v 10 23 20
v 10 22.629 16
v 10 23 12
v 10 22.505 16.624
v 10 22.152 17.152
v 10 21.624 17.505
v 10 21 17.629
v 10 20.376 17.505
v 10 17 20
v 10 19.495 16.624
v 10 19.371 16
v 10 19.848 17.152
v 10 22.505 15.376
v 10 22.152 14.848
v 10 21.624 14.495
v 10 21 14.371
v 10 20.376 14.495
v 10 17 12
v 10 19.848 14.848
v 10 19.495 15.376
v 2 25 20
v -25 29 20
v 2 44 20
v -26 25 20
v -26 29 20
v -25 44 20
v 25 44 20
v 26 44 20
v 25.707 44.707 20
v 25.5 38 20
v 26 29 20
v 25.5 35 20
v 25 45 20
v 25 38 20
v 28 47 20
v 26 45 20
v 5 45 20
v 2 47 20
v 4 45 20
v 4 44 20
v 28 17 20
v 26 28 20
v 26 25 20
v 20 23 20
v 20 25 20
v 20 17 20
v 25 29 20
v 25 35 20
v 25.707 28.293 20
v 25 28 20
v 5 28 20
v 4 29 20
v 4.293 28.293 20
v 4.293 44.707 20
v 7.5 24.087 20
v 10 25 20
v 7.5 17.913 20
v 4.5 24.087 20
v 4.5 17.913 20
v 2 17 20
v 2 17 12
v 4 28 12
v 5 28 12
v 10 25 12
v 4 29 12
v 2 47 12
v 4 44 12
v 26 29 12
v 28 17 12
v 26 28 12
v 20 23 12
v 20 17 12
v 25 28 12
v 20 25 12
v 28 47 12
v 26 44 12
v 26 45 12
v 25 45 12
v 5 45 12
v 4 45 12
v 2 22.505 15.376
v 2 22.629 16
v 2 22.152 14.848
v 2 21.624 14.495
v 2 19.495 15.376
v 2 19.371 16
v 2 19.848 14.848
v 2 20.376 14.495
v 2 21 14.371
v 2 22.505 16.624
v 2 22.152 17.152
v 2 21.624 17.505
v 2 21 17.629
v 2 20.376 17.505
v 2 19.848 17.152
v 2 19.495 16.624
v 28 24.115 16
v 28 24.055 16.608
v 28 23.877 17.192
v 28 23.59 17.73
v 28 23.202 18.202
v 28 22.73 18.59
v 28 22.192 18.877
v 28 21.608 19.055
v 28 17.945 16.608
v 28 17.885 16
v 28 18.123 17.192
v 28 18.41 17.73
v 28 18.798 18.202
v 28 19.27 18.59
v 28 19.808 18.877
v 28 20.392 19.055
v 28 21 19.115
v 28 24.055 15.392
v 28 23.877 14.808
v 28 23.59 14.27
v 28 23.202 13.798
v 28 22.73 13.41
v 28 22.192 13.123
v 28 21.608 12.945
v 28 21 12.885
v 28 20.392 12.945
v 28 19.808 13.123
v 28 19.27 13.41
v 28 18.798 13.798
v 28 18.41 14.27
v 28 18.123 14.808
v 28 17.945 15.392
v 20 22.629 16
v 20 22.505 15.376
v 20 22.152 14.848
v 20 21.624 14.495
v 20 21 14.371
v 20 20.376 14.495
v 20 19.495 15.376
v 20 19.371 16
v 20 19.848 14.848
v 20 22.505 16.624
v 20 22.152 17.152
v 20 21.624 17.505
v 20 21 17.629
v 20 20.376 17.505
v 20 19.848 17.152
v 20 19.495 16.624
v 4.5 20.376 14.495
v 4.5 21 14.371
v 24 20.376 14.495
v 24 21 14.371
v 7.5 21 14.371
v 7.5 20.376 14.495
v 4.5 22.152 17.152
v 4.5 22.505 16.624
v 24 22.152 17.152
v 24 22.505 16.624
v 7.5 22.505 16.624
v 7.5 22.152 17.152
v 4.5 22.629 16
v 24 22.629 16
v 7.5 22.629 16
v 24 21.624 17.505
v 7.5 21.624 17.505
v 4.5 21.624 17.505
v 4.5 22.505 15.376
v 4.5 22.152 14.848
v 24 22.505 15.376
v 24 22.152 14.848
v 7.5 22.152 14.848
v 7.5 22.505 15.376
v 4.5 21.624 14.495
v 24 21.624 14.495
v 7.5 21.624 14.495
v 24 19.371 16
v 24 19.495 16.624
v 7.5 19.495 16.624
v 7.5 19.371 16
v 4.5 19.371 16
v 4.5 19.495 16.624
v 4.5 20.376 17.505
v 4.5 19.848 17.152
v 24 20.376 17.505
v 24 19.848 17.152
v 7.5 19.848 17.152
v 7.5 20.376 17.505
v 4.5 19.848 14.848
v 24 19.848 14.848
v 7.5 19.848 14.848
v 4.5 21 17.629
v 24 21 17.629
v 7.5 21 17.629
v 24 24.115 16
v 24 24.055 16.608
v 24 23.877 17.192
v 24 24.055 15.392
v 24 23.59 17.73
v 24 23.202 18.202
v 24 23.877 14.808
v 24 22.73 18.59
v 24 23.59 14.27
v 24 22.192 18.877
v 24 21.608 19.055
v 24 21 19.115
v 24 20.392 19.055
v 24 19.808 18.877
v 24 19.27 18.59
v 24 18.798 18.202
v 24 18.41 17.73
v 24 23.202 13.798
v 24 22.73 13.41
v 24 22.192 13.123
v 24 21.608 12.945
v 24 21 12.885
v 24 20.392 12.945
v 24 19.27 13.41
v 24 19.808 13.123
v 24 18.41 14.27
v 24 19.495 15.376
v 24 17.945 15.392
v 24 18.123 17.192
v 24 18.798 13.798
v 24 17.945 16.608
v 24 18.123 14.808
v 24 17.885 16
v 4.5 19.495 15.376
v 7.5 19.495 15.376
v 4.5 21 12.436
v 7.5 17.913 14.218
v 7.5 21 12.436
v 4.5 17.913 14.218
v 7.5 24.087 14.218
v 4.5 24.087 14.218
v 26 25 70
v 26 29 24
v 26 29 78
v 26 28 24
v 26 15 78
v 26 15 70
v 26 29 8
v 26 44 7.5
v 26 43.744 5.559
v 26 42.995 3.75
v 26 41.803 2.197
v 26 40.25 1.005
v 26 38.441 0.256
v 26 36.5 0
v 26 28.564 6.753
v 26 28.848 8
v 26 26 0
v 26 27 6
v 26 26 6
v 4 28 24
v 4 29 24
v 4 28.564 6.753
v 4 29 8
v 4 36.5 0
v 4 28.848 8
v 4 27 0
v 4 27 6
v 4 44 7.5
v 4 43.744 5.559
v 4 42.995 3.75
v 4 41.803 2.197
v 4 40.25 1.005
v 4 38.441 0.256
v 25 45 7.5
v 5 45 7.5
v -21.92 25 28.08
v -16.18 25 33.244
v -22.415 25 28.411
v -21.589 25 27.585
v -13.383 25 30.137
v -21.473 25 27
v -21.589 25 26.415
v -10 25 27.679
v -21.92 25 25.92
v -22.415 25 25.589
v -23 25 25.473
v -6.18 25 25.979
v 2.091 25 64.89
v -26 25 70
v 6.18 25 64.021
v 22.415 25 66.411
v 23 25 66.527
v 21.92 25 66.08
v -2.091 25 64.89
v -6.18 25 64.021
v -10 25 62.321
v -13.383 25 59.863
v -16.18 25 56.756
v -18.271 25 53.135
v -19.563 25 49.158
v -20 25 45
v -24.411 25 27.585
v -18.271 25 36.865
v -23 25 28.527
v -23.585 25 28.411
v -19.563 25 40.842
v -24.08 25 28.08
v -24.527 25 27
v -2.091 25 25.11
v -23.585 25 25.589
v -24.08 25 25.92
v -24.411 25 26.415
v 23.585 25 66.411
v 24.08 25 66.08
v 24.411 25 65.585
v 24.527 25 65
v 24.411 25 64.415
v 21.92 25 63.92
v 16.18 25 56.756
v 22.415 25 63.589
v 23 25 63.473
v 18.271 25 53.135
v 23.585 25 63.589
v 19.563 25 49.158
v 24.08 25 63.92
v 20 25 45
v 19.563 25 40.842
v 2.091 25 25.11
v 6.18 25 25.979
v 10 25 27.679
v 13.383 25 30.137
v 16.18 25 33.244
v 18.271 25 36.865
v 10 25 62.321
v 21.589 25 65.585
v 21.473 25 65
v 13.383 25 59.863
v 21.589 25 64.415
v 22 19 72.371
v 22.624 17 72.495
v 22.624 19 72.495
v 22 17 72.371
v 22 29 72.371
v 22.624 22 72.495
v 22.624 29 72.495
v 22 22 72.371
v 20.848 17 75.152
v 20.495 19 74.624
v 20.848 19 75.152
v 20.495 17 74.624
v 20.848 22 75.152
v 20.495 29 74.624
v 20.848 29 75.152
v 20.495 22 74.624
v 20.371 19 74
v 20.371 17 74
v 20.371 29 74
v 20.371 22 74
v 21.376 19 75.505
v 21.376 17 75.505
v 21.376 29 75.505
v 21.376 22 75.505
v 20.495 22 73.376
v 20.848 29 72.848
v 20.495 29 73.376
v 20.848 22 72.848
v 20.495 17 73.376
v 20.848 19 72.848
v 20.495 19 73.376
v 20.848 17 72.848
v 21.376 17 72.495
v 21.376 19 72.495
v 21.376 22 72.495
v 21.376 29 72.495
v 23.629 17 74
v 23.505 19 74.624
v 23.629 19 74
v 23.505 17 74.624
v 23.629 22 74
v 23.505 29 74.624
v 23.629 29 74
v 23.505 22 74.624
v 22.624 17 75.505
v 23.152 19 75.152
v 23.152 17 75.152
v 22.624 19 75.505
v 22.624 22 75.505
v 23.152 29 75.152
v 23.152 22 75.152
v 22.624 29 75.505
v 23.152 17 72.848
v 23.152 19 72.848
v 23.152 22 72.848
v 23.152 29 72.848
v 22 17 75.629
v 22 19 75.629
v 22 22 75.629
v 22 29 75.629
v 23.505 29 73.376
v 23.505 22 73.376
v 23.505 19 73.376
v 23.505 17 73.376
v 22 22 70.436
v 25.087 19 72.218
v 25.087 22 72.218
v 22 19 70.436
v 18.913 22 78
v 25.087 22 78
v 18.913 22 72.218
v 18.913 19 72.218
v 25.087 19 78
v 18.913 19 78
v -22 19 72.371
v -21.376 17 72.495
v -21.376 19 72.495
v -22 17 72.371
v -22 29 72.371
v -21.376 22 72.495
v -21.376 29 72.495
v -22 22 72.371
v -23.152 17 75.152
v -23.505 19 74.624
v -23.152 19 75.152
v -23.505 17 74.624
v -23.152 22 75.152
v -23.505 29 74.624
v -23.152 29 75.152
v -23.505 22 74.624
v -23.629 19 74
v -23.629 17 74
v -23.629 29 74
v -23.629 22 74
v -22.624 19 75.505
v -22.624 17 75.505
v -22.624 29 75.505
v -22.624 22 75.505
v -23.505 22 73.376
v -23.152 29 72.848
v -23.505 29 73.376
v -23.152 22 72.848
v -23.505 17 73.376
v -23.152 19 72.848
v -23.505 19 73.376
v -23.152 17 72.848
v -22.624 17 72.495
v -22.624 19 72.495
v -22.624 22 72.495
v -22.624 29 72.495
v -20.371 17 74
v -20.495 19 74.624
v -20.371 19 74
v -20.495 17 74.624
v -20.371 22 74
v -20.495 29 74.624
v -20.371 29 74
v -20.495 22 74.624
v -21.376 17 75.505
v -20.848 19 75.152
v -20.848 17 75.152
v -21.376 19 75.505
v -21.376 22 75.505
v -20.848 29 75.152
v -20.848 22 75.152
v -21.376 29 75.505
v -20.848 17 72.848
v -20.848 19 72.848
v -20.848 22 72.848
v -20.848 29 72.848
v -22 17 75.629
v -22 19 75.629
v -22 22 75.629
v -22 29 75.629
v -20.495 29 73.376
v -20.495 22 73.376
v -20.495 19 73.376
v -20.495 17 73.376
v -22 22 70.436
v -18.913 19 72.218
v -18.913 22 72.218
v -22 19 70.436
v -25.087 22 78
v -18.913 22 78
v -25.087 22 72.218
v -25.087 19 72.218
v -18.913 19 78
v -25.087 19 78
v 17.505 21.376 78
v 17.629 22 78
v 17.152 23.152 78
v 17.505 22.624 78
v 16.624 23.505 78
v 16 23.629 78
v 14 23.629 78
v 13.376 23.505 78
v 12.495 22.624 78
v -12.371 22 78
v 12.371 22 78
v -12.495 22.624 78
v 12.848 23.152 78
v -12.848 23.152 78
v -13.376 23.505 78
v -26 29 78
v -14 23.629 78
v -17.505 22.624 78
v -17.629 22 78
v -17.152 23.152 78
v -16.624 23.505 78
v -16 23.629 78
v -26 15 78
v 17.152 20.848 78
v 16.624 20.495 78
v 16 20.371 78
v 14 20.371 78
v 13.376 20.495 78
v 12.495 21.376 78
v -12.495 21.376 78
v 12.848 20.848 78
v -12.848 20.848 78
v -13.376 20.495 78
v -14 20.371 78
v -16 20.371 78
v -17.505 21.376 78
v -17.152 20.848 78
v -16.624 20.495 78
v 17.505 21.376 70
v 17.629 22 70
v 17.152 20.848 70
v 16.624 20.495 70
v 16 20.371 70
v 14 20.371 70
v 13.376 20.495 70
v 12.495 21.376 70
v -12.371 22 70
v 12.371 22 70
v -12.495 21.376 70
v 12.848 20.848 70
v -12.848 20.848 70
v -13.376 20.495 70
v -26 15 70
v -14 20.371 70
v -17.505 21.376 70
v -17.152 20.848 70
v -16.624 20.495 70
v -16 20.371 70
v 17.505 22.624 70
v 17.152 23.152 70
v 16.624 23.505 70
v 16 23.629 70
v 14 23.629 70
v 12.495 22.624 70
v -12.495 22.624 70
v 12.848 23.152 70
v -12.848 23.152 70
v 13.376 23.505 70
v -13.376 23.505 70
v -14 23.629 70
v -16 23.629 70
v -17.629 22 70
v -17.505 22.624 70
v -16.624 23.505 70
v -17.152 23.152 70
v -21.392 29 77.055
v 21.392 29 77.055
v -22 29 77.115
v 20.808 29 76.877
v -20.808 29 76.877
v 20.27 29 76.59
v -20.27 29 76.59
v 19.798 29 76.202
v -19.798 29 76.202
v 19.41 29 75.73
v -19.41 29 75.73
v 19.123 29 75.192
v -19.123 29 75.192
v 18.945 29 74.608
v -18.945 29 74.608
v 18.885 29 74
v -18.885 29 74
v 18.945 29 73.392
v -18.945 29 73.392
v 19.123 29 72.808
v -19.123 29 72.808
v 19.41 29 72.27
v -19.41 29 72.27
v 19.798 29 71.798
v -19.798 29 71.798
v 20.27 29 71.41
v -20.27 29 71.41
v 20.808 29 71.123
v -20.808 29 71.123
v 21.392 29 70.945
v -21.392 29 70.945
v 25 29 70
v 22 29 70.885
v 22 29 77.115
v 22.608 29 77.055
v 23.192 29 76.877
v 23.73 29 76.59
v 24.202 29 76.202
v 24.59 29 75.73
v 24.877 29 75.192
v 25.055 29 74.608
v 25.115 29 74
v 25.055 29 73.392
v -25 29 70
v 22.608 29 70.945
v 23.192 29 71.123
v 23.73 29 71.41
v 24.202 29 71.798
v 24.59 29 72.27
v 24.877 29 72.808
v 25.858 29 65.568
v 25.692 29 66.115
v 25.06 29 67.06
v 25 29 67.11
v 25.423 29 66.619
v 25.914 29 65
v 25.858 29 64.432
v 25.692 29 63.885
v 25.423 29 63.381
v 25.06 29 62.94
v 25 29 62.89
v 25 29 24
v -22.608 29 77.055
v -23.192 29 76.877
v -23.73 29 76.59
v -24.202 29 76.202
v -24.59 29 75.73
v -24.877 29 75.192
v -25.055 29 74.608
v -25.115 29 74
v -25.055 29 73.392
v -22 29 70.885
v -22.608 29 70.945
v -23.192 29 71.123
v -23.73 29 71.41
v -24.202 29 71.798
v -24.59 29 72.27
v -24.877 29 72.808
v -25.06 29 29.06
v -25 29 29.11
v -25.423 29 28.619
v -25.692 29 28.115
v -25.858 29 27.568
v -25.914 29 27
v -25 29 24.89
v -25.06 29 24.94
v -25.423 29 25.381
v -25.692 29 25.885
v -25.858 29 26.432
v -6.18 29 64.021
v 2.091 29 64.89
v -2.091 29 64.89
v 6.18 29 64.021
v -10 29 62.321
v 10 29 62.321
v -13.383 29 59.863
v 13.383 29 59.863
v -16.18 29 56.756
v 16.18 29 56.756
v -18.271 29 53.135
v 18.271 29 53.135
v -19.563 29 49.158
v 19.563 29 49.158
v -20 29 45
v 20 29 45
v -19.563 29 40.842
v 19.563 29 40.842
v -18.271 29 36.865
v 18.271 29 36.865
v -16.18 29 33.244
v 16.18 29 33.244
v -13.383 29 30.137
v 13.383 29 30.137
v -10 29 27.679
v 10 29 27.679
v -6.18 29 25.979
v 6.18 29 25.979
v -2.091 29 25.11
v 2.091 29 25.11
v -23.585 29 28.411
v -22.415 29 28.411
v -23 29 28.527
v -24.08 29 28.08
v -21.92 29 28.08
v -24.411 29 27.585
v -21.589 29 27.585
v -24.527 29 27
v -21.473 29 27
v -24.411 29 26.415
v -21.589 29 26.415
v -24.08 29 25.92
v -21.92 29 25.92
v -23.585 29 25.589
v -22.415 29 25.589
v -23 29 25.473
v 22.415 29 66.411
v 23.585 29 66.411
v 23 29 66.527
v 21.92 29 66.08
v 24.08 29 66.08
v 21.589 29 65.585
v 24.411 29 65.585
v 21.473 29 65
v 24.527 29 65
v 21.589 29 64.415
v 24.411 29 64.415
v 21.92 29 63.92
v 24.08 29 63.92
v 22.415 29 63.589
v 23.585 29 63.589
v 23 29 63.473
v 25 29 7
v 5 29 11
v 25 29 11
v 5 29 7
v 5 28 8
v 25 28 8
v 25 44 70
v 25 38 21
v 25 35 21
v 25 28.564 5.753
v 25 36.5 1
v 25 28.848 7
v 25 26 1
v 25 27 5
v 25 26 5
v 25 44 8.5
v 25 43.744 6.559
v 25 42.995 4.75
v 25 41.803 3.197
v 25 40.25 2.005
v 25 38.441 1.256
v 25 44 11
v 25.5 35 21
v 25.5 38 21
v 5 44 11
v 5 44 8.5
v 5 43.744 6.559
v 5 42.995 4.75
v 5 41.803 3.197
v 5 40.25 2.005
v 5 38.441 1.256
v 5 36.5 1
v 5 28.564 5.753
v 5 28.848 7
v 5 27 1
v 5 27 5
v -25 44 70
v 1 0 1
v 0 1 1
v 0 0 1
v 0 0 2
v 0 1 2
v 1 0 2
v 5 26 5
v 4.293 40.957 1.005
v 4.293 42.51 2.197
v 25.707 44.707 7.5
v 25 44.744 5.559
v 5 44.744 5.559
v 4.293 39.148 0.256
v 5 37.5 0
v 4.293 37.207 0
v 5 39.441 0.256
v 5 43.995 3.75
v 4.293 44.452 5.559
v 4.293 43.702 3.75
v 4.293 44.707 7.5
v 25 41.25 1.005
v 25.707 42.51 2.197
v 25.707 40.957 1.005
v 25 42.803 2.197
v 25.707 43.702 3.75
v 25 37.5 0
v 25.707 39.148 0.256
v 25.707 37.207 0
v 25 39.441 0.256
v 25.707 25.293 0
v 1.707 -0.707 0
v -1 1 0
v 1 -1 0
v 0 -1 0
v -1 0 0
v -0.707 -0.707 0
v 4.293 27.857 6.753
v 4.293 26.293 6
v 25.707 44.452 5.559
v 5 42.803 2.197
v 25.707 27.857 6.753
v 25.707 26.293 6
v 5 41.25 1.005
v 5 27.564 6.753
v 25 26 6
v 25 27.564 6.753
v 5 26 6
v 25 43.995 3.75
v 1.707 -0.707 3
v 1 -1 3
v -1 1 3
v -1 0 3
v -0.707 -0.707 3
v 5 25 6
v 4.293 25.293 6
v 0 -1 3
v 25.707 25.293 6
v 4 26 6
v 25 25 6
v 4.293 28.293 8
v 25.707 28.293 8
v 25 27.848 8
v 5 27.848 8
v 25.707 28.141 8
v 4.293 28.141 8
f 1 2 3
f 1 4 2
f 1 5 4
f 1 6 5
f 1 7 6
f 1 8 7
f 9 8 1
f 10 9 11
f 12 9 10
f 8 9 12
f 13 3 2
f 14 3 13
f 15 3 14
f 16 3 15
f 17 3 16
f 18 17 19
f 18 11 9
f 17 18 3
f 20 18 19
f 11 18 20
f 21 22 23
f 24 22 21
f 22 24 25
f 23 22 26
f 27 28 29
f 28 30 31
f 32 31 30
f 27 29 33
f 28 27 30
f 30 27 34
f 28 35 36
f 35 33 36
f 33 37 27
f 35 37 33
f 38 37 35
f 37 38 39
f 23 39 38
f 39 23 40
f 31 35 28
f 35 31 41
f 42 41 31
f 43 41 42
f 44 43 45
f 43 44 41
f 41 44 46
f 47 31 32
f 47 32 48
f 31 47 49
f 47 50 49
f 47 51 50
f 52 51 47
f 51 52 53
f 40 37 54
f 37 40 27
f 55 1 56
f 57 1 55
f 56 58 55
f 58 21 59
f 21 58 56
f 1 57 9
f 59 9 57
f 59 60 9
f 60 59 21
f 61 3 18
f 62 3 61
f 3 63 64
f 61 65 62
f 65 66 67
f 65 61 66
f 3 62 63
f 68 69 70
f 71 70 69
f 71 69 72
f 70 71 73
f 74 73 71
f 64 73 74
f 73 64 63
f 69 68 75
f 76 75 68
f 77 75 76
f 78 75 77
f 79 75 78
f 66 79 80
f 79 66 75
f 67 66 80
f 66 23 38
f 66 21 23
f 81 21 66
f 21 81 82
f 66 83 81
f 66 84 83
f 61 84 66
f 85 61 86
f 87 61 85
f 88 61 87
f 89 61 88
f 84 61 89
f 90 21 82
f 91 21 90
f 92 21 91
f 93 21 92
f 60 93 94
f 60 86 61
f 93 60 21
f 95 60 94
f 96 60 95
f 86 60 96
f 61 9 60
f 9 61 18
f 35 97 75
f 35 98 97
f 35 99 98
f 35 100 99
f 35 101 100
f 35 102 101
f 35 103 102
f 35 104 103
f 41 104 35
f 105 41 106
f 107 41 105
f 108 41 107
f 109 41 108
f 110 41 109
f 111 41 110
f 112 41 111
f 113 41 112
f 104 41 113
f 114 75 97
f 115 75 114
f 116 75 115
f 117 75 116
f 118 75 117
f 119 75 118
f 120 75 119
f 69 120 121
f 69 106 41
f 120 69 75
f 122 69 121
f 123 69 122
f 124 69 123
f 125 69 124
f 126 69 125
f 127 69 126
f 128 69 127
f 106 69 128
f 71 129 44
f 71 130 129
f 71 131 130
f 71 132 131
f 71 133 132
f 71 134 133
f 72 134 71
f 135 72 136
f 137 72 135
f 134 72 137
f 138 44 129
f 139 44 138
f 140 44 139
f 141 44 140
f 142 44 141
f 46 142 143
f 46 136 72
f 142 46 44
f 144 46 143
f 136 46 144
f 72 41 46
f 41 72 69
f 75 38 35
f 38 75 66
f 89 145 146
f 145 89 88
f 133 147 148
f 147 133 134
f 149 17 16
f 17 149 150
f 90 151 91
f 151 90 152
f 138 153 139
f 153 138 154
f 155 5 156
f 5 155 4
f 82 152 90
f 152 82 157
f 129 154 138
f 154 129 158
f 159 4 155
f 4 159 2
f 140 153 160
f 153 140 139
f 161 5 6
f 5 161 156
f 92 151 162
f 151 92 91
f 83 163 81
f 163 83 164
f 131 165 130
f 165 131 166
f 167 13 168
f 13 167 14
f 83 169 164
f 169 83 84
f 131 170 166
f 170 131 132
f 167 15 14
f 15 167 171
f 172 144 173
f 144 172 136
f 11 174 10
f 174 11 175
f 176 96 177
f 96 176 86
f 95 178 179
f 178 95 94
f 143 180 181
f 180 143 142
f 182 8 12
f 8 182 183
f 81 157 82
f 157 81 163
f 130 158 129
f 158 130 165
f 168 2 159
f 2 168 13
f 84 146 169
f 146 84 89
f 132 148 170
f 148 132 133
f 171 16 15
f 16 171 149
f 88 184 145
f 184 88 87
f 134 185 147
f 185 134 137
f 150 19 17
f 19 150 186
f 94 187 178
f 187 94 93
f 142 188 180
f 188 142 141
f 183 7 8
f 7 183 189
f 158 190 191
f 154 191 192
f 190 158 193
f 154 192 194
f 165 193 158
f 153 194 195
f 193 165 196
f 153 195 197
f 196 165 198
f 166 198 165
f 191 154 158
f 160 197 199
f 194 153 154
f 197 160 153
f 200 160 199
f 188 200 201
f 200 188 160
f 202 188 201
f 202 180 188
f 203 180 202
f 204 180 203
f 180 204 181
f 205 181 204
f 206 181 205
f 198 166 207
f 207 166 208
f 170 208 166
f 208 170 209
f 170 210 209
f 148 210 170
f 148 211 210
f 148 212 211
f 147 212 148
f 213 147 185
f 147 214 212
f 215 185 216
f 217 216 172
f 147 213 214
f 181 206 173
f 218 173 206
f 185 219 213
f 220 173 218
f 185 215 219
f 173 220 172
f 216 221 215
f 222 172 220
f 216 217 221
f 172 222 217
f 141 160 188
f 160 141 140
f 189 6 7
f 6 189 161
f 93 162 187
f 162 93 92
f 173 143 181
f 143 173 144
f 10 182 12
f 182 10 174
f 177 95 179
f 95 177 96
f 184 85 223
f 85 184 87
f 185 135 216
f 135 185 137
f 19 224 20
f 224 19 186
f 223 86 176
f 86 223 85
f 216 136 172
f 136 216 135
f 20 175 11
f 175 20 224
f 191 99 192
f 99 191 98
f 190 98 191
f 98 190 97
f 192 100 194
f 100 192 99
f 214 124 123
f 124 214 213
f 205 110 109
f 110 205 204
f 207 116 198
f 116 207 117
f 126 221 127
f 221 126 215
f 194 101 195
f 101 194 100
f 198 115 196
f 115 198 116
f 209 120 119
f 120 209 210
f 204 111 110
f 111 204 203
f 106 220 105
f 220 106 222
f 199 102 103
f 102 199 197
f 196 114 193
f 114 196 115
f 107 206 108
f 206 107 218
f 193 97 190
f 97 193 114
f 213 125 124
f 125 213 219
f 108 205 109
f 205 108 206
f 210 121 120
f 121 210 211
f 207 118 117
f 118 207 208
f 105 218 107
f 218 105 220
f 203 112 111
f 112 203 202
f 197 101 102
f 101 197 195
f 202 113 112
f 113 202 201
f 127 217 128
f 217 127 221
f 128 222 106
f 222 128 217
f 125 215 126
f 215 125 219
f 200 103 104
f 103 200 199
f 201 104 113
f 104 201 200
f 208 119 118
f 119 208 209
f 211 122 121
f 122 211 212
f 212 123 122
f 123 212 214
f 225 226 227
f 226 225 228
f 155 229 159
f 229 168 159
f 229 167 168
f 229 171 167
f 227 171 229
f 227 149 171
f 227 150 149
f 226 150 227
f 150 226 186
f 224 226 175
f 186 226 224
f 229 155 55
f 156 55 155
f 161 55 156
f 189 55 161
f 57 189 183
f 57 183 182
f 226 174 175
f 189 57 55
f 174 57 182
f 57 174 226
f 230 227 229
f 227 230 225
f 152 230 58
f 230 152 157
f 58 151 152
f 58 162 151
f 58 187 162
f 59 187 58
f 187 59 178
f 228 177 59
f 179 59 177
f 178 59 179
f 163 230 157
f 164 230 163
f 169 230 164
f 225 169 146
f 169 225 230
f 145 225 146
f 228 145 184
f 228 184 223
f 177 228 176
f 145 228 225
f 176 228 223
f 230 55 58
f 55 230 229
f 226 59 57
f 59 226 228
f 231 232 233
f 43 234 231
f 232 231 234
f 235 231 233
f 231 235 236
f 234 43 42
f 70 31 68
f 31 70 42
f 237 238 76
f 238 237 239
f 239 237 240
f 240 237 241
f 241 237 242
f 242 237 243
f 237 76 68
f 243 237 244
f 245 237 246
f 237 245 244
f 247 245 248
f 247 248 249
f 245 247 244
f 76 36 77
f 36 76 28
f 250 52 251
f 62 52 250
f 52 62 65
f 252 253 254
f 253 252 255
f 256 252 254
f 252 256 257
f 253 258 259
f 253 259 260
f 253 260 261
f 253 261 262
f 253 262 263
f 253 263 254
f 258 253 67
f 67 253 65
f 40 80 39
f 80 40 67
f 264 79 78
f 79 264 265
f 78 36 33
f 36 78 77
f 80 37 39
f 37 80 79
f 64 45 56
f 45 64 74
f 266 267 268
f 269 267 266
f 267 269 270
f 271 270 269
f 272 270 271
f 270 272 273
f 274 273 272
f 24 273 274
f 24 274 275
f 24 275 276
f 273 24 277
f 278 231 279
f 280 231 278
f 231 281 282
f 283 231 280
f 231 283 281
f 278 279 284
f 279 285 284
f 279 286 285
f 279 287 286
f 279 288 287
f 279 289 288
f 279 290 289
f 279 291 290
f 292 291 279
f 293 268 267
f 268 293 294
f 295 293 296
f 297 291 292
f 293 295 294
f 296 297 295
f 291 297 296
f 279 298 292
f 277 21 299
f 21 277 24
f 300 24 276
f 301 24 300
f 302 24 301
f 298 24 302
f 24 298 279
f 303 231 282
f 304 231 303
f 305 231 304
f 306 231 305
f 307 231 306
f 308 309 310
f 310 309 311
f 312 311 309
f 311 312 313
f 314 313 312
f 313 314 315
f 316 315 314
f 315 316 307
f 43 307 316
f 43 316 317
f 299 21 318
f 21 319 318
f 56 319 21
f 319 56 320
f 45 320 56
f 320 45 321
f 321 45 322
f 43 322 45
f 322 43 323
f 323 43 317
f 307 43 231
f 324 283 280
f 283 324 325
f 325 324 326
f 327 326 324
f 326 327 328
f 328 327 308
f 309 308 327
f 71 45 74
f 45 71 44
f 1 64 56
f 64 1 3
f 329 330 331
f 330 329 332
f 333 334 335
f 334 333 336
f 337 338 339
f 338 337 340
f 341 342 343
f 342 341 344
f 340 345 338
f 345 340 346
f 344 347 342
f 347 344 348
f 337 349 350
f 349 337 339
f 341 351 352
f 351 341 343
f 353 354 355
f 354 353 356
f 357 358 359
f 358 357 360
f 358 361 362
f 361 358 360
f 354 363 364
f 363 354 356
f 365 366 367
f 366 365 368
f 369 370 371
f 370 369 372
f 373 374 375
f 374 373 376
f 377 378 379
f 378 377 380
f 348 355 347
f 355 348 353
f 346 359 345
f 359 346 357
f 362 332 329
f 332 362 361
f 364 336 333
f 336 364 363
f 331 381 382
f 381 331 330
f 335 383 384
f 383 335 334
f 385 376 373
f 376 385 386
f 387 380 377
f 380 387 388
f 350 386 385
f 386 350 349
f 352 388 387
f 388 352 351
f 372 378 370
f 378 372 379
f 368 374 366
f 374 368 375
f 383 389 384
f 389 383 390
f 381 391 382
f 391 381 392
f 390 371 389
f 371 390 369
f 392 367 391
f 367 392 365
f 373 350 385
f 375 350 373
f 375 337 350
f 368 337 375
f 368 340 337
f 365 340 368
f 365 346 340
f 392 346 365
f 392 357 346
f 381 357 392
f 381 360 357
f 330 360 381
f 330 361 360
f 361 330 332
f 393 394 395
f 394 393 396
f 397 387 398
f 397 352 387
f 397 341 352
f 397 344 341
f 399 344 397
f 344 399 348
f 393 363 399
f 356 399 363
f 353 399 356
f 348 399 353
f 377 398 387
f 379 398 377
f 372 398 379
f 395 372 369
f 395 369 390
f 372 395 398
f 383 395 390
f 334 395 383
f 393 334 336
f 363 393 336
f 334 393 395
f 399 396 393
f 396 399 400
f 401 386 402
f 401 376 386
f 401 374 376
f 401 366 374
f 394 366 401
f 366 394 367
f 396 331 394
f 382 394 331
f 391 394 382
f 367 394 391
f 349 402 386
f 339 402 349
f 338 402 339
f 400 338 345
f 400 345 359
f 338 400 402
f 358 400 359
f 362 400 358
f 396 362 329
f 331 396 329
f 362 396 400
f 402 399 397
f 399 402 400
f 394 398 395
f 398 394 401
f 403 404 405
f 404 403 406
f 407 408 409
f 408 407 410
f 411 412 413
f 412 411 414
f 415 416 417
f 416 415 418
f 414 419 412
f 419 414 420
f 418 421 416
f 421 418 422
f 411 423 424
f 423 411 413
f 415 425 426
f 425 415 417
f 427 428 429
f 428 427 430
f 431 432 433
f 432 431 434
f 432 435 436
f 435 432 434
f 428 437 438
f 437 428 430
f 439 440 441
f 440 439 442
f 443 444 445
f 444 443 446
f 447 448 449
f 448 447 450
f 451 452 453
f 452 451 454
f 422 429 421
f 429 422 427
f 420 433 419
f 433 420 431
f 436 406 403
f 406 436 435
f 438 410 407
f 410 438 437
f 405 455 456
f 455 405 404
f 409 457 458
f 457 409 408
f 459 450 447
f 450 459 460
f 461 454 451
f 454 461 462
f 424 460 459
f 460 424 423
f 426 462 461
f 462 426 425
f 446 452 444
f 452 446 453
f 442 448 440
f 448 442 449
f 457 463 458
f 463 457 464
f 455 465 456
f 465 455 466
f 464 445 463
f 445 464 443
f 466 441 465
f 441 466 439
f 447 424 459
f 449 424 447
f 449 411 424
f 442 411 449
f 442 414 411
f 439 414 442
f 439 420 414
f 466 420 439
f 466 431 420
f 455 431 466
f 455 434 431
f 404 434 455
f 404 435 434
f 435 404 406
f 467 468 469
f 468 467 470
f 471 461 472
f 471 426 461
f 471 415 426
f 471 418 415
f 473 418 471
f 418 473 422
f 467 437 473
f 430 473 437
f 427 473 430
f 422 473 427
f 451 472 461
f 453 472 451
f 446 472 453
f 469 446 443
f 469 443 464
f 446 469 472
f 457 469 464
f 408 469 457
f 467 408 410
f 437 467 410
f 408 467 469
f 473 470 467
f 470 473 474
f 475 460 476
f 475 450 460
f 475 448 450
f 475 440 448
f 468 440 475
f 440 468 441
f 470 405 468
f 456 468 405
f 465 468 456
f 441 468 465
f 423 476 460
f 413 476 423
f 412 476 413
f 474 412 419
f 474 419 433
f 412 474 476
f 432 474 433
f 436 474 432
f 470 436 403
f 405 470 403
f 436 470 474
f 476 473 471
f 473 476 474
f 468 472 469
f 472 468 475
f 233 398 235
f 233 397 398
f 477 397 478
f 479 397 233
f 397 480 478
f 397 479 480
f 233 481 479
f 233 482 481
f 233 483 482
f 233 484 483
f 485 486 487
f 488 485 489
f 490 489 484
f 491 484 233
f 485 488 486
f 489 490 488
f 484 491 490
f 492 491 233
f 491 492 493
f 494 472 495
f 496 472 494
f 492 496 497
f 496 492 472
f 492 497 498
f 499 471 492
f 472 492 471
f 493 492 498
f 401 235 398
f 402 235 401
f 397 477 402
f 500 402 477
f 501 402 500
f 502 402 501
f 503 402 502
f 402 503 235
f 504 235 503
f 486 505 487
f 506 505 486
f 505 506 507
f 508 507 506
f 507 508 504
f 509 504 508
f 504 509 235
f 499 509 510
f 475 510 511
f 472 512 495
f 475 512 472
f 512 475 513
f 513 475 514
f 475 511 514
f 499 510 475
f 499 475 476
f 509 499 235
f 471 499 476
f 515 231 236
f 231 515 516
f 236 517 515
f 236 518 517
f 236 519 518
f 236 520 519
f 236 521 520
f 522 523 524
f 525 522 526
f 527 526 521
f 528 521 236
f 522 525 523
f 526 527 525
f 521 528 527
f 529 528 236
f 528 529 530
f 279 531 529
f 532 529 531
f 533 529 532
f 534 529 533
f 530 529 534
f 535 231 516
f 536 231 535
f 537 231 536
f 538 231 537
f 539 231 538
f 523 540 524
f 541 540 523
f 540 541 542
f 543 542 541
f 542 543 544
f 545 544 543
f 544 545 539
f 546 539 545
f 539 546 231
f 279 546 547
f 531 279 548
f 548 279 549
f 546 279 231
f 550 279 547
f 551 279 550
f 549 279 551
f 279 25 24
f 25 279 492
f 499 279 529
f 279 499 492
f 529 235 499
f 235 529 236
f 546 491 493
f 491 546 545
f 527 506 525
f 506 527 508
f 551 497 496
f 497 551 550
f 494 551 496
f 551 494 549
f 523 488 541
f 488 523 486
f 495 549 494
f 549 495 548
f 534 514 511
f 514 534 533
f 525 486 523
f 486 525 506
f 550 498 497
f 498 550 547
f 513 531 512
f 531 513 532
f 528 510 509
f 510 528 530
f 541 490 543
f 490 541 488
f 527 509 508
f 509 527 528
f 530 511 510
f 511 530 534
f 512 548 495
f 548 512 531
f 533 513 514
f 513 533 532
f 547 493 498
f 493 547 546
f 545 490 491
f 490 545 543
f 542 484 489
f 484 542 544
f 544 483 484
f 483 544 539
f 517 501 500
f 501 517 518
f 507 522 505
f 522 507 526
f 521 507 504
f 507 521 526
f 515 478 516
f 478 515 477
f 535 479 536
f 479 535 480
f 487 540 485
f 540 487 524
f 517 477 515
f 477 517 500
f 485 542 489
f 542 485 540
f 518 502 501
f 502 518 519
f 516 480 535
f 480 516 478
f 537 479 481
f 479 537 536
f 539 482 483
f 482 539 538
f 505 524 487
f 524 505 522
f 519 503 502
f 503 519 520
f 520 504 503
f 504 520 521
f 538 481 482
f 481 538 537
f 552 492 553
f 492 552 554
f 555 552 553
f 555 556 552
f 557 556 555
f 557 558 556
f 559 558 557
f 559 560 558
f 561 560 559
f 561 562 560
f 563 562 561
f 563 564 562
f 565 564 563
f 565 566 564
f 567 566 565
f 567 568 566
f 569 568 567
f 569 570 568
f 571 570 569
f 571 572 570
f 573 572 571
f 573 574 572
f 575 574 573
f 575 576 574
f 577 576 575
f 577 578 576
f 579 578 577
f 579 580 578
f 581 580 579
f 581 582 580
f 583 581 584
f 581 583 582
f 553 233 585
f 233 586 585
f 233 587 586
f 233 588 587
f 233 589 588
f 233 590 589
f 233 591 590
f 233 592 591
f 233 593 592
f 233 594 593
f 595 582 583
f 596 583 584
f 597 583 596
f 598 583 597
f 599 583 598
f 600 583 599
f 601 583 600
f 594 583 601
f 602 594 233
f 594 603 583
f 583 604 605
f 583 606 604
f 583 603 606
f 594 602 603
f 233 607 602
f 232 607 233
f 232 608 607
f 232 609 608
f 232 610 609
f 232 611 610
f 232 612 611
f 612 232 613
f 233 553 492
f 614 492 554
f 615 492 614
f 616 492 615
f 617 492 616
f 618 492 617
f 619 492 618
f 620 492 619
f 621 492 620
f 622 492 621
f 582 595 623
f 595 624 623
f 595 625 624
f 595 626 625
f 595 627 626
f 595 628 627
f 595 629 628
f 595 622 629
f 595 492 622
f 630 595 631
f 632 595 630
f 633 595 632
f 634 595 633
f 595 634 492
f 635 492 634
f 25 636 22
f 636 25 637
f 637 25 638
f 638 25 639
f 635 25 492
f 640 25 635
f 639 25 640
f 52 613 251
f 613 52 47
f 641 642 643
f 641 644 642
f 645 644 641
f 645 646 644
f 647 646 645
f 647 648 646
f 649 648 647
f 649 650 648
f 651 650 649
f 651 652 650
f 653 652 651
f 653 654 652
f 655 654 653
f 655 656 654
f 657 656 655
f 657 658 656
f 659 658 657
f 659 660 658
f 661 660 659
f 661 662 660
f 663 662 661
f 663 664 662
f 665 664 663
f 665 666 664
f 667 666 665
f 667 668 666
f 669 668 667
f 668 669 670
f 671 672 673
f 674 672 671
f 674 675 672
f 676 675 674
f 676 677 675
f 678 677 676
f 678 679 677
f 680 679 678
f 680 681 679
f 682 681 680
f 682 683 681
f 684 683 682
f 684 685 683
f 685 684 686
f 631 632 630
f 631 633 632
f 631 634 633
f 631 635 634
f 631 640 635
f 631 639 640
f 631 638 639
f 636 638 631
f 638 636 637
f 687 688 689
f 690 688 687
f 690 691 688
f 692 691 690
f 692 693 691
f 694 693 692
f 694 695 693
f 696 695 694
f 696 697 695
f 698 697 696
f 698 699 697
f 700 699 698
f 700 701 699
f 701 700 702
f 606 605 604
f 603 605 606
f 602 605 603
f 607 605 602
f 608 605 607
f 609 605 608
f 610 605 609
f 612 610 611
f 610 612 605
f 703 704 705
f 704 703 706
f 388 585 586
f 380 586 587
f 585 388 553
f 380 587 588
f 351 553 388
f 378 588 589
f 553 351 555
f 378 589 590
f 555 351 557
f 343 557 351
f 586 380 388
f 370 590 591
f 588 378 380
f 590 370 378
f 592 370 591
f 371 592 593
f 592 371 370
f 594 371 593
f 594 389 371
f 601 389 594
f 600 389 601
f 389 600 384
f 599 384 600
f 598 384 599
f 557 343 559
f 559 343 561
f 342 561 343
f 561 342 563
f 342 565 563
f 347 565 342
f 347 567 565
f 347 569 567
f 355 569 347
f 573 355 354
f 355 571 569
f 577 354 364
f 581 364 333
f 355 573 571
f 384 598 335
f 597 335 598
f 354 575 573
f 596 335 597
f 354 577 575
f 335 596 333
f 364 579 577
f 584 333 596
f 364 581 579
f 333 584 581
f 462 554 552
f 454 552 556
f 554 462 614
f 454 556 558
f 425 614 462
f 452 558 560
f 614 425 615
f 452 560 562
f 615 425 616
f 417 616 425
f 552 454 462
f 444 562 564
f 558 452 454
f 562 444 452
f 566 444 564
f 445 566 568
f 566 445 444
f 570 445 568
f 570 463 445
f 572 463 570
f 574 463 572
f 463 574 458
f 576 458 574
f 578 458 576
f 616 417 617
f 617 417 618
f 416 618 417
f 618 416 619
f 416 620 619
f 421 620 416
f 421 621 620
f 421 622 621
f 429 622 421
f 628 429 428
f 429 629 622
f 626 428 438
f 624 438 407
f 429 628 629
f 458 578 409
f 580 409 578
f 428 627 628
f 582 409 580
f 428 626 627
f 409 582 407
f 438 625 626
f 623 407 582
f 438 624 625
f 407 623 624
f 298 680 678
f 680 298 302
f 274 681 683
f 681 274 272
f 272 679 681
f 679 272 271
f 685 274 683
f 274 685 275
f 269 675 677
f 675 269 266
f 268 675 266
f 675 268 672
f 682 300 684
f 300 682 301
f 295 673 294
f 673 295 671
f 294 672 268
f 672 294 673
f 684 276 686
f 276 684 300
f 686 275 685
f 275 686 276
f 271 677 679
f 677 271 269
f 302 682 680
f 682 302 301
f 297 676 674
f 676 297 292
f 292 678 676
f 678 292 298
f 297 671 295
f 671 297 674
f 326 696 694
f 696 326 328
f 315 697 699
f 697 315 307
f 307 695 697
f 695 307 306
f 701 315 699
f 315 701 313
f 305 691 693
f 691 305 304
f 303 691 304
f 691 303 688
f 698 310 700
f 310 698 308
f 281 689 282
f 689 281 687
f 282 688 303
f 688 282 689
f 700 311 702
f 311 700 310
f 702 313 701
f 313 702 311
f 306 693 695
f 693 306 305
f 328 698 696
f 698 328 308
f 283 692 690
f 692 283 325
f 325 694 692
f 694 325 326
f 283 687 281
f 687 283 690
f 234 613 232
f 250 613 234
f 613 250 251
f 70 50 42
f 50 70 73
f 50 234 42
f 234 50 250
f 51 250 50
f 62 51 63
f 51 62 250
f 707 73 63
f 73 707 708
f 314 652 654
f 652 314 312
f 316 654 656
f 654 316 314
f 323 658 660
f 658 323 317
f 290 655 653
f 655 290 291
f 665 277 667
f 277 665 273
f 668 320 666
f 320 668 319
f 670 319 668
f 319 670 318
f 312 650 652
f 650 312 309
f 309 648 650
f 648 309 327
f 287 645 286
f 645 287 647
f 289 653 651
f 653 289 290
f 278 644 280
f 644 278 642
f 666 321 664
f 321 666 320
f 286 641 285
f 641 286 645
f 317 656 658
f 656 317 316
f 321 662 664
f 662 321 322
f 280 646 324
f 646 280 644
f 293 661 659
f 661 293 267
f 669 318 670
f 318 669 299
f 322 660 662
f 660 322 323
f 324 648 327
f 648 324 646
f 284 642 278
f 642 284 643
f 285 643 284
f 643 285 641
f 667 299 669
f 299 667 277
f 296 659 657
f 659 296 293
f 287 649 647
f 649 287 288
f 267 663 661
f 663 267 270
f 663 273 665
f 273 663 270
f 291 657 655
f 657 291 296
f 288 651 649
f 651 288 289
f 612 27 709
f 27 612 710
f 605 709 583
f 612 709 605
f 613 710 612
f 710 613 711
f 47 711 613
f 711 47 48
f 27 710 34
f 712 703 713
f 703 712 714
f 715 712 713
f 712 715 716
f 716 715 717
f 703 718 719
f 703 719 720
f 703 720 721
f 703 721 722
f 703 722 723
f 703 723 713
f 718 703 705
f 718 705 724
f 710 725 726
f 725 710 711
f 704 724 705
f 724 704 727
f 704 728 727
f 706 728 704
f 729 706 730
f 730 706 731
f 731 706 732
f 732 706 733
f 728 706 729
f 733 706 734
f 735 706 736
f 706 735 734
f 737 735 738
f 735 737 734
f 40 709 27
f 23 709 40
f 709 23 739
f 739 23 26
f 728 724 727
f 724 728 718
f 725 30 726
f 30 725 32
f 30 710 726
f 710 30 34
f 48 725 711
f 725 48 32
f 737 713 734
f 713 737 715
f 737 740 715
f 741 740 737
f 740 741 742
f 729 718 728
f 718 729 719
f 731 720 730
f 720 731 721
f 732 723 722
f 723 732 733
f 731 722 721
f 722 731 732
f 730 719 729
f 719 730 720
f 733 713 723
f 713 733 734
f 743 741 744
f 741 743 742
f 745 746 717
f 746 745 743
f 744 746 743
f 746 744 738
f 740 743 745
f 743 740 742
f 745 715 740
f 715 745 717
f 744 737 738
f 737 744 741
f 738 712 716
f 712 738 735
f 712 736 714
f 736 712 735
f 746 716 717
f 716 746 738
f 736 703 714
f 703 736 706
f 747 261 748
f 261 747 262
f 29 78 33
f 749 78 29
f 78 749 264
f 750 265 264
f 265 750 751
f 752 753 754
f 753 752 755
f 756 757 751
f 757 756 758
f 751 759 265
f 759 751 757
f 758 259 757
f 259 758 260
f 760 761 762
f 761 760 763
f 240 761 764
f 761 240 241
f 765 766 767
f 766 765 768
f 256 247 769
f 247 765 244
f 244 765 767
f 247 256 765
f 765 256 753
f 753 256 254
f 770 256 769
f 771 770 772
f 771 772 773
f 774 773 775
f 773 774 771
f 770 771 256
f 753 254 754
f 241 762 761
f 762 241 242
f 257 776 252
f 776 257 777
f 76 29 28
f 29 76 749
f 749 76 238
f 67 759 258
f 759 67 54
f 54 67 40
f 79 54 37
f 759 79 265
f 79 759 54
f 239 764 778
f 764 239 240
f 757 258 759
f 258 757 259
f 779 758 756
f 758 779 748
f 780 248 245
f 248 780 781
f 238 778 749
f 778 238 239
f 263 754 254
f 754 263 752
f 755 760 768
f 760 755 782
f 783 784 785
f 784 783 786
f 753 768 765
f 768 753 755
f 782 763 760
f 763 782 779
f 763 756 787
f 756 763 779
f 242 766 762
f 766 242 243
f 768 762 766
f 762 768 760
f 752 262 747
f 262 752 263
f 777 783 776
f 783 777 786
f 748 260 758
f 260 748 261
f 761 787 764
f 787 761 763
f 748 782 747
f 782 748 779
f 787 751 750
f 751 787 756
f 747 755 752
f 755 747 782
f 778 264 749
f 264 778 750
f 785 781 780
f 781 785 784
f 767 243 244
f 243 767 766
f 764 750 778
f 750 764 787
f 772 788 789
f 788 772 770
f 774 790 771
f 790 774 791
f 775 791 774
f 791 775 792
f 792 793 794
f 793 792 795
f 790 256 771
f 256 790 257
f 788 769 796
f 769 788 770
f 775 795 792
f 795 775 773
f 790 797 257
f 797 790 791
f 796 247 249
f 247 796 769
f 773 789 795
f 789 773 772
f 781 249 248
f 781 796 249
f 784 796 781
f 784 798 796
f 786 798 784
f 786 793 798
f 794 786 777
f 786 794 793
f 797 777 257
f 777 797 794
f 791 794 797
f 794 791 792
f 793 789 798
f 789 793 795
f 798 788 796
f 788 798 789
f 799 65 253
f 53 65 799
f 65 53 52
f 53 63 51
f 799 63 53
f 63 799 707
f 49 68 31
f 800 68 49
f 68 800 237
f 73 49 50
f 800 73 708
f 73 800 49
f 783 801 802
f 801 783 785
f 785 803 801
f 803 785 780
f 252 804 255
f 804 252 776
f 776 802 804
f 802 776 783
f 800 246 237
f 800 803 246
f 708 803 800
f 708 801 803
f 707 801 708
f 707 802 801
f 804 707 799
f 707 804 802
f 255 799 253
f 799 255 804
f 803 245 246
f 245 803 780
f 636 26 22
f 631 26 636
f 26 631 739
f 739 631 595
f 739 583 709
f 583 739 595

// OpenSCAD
// file: bolts.scad
$radial_error = 0.1;
$fn = 16;

module cylinder_outer(height, radius, fn=$fn, extension=0) {
	fudge = 1/cos(180/fn);
	translate([0, 0, -extension]) cylinder(h=height+extension,r=radius*fudge+$radial_error, $fn=fn);
}

module cylinder_inner(height, radius, fn=$fn, extension=0) {
	translate([0, 0, -extension]) cylinder(h=height+extension,r=radius-$radial_error,$fn=fn);
}

// Make a hole for a bolt/screw combination.
module bolt(diameter=3, depth=8, nut_offset=2, shaft_length=10, inset=10) {
	hole(diameter, depth, inset);
	hull() {
		shaft_width = diameter;
		translate([0, 0, nut_offset]) rotate(360/12, [0, 0, 1]) cylinder_outer(diameter, shaft_width, 6);
		translate([0, shaft_length, nut_offset]) rotate(360/12, [0, 0, 1]) cylinder_outer(diameter, shaft_width, 6);
	}
}

// Make a hole. The diameter is the size of the screw (e.g. 3 for M3). Depth is how far the hole should go for the thread, and inset is how far out there should be a hole for the head to go.
module hole(diameter=3, depth=6, inset=10, extension=0) {
	cylinder_outer(depth, diameter/2, extension=extension);
	translate([0, 0, depth]) cylinder_outer(inset, diameter, 32);
}

module countersunk_hole(diameter=3, depth=6, inset=10) {
	hole(diameter, depth, inset);
	translate([0, 0, depth-diameter/2]) cylinder(r1=diameter/2+$radial_error, r2=diameter+$radial_error, h=diameter/2);
}

module mounting_hole(diameter=3, depth=6, inset=10, outset=3) {
	difference() {
		cylinder_outer(depth, diameter/2+outset);
		hole(diameter=diameter, depth=depth, inset=inset);
	}
}

rotate(90, [1, 0, 0]) difference() {
	cube([30, 10, 10]);
	translate([5, 5, 0]) bolt(diameter=3, depth=8);
	translate([15, 5, 0]) bolt(diameter=4, depth=8);
	translate([25, 5, 0]) countersunk_hole(diameter=4, depth=8);
}
// main file
use <bolts.scad>;

clip_offset = 0.5;
extruder_offset = 20;

// The amount to offset the fan duct. This really depends on the kind of blower fan you have and how far it fits on the ducting.
fan_duct_offset = 1;

// Distance from outside of metal case to center of extruder.
fan_mount_offset = 24;
top_screws_offset = -1.5 / 2;

thickness = 1;
offset = 4;

module clip() {
	color("blue") render() translate([2, 0, 12]) {
		difference() {
			union() {
				translate([0, -8, 0]) {
					cube([8, 8, 8]);
					translate([18, 0, 0]) cube([8, 8, 8]);
				}
				translate([0, -2, 0]) cube([26, 24, 8]);
			}
			translate([2, 0, 0]) cube([22, 20, 8]);
			translate([2+6, -2, 0]) cube([22-12, 2, 8]);
			
			translate([0, -4, 4]) rotate([90, 0, 90]) bolt(3, 22, 2.5);
		}
	}
}

module fan_opening() {
	translate([0, offset, 0]) {
		translate([5, 0, 11]) cube([20, 15, 10]);
		translate([25, 15/2-3/2, 20-3]) cube([0.5, 3, 4]);
	}
}

module fan_intake(inner_radius, outer_radius, duct_rotation, height=4, width=20, inset_radius=2) {
	render() translate([5, 0, 0]) difference() {
		union() {
			translate([0, offset, 10]) cube([20, 15, 10-thickness-fan_duct_offset]);
			// Fan attachment:
			hull() {
				translate([0, offset, 10]) cube([20, 15, 1]);
				intersection() {
					translate([0, 15/2+offset, 15/2]) rotate(90, [0, 1, 0]) cylinder(h=20,r=15/2);
					translate([0, offset, 0]) cube([20, 15, 10]);
				}
				
				translate([0, offset-inset_radius, 0]) rotate(-90, [0, 0, 1]) cube([1, 20, height]);
			}
			
			// Bottom connector to duct:
			hull() {
				across = outer_radius - inner_radius;
				
				translate([0, offset-inset_radius, 0]) rotate(-90, [0, 0, 1]) cube([1, 20, height]);
				translate([-5, -25, 0]) rotate(duct_rotation, [0, 0, 1]) translate([-1, inner_radius, 0]) cube([1, across, height]);
			}
		}
		
		// Cut out the rounded inset:
		inset_offset = height + inset_radius;
		
		translate([0, -inset_radius+offset, inset_offset]) rotate(90, [0, 1, 0]) cylinder(h=width,r=inset_radius);
		translate([0, -inset_radius-height, height]) cube([width, height+offset, 10]);
		translate([0, -inset_radius+offset, inset_offset]) cube([20, inset_radius, inset_radius+height]);
	}
}

module fan_ducting_example(o) {
	render() translate([0, 0, thickness]) difference() {
		union() {
			render() minkowski() {
				fan_intake();
				translate([0, 0, -thickness]) cylinder(h=thickness*2,r=thickness,$fn=8);
			}
		}
		fan_intake();
		fan_opening();
	}
}

module fan_mock() {
	render() translate([0, offset, extruder_offset+50/2]) rotate(-90, [1, 0, 0]) {
		translate([0, 0, 15/2]) cube([50, 50, 15], center=true);
	}
}

block_height = 8;

module fan_mount_holes(thickness=2) {
	translate([0, -thickness-8, 50+block_height/2]) rotate(180, [0, 0, 1]) rotate(90, [1, 0, 0]) {
		translate([-22, 0, 0]) bolt(depth=10);
		translate([ 22, 0, 0]) bolt(depth=10);
	}
}

module fan_mount_top(inset=2) {
	render() translate([0, 2, extruder_offset]) difference() {
		translate([-26, -inset, 0]) {
			// scews centered by 30 apart
			translate([0, -10, 50]) cube([52, 10, block_height]);
		}
		
		// The offset of the screw is 3 from the edge.
		hull() {
			translate([-14, -inset-3, 50]) hole(depth=block_height, inset=0);
			translate([-16, -inset-3, 50]) hole(depth=block_height, inset=0);
		}
		
		hull() {
			translate([14, -inset-3, 50]) hole(depth=block_height, inset=0);
			translate([16, -inset-3, 50]) hole(depth=block_height, inset=0);
		}
		
		fan_mount_holes();
	}
}

module fan_mount_bracket(thickness=4) {
	bottom_extension = 8;
	
	render() translate([0, thickness, extruder_offset]) difference() {
		translate([-26, -thickness, 0]) {
			//55 to base of fan
			translate([0, 0, 0]) cube([52, thickness, 50+block_height]);
			
			translate([30, 0, -bottom_extension]) cube([22, 18, bottom_extension+2]);
		}
		
		// Inset for duct attachment:
		translate([4, -1, -bottom_extension]) cube([22, 1+16+4, bottom_extension+4]);

		translate([0, 0, 25]) rotate(90, [1, 0, 0]) cylinder(r=20,h=thickness+1);
		
		translate([0, 0, 50/2]) rotate([-90, 0, 0]) {
			translate([-23, 18, -thickness]) hole(diameter=2.8, depth=thickness, inset=1, extension=1);
			translate([23, -20, -thickness]) hole(diameter=2.8, depth=thickness, inset=1, extension=1);
		}
		
		fan_mount_holes();
	}
}

module extruder() {
	color("orange") {
		translate([0, 0, 6]) cylinder(h=70-6, r=3);
		cylinder(h=6,r1=0.5, r2=5);
		translate([0, 0, 10+15/2]) cube([18, 22, 15], true);
	}
}

module fan_example() {
	//extruder();
	translate([0, 25, 0]) {
		fan_mock();
		
		clip();
		
		fan_mount_top();
		fan_mount_bracket();
		
		fan_ducting_example();
		
		color("red") fan_opening();
		//color("blue") fan_intake();
		//color("green") fan_intake_plug();
	}
}

module fan_bracket() {
	translate([0, fan_mount_offset, 0]) {
		fan_mount_bracket();
		fan_mount_top();
	}
}

fan_example();
